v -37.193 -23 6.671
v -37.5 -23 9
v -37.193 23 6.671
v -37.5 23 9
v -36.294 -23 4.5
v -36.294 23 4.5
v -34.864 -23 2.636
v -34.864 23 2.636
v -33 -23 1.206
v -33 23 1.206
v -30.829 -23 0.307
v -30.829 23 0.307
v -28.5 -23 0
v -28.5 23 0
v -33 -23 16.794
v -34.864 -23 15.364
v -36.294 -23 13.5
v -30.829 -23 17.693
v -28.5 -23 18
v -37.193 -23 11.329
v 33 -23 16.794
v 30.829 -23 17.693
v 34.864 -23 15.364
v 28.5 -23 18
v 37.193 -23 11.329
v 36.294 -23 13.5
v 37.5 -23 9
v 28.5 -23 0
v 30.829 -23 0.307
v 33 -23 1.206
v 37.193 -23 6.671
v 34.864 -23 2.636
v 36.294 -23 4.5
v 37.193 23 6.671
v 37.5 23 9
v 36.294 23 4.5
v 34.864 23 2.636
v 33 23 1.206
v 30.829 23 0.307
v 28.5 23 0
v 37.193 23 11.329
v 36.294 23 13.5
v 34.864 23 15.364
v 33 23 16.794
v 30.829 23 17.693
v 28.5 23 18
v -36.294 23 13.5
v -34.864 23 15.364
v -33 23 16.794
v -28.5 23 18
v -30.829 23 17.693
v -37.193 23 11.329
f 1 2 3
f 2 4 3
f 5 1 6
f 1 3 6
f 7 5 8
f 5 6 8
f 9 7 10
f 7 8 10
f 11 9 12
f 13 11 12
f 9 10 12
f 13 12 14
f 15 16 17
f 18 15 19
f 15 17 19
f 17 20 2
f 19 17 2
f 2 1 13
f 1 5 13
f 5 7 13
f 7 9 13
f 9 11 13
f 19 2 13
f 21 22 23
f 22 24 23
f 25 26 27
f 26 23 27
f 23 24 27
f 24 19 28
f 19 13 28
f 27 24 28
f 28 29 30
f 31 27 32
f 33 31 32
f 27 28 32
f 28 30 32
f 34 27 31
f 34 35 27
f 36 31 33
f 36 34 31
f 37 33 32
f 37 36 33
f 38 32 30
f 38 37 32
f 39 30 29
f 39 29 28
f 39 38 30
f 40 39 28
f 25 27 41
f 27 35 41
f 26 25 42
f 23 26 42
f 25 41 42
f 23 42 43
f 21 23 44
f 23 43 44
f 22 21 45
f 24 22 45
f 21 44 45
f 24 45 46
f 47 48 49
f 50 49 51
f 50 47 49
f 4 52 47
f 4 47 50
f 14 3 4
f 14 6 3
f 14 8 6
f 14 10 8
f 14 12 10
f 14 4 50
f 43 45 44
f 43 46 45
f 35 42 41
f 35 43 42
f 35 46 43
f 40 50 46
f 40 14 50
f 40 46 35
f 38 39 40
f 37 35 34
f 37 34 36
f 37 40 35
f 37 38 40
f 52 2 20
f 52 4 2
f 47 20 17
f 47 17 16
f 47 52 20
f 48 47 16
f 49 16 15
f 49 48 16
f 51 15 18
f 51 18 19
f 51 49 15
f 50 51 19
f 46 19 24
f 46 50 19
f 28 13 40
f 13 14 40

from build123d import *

# Parameters (mm, degrees)
F0_W     = 75
F0_H     = 46
F1_DEPTH = 18
F2_R     = 8.99999


# Not quite as in the source:
# - a fillet or chamfer is up to 0.001 mm smaller than in the source, because OpenCascade refuses the exact size


with BuildPart() as f1:
    # F0 (on Top) → F1 (new body)
    with BuildSketch(Plane.XY):
        Rectangle(F0_W, F0_H)
    extrude(amount=F1_DEPTH)

    # F2 (radius 9 in the source; OpenCascade refuses exactly that, so slightly less here)
    f2_edges = [f1.edges().sort_by_distance(p)[0] for p in [
        (37.5, 0, 18),
        (37.5, 0, 0),
        (-37.5, 0, 0),
        (-37.5, 0, 18),
    ]]
    fillet(f2_edges, radius=F2_R)


solid = f1.part
